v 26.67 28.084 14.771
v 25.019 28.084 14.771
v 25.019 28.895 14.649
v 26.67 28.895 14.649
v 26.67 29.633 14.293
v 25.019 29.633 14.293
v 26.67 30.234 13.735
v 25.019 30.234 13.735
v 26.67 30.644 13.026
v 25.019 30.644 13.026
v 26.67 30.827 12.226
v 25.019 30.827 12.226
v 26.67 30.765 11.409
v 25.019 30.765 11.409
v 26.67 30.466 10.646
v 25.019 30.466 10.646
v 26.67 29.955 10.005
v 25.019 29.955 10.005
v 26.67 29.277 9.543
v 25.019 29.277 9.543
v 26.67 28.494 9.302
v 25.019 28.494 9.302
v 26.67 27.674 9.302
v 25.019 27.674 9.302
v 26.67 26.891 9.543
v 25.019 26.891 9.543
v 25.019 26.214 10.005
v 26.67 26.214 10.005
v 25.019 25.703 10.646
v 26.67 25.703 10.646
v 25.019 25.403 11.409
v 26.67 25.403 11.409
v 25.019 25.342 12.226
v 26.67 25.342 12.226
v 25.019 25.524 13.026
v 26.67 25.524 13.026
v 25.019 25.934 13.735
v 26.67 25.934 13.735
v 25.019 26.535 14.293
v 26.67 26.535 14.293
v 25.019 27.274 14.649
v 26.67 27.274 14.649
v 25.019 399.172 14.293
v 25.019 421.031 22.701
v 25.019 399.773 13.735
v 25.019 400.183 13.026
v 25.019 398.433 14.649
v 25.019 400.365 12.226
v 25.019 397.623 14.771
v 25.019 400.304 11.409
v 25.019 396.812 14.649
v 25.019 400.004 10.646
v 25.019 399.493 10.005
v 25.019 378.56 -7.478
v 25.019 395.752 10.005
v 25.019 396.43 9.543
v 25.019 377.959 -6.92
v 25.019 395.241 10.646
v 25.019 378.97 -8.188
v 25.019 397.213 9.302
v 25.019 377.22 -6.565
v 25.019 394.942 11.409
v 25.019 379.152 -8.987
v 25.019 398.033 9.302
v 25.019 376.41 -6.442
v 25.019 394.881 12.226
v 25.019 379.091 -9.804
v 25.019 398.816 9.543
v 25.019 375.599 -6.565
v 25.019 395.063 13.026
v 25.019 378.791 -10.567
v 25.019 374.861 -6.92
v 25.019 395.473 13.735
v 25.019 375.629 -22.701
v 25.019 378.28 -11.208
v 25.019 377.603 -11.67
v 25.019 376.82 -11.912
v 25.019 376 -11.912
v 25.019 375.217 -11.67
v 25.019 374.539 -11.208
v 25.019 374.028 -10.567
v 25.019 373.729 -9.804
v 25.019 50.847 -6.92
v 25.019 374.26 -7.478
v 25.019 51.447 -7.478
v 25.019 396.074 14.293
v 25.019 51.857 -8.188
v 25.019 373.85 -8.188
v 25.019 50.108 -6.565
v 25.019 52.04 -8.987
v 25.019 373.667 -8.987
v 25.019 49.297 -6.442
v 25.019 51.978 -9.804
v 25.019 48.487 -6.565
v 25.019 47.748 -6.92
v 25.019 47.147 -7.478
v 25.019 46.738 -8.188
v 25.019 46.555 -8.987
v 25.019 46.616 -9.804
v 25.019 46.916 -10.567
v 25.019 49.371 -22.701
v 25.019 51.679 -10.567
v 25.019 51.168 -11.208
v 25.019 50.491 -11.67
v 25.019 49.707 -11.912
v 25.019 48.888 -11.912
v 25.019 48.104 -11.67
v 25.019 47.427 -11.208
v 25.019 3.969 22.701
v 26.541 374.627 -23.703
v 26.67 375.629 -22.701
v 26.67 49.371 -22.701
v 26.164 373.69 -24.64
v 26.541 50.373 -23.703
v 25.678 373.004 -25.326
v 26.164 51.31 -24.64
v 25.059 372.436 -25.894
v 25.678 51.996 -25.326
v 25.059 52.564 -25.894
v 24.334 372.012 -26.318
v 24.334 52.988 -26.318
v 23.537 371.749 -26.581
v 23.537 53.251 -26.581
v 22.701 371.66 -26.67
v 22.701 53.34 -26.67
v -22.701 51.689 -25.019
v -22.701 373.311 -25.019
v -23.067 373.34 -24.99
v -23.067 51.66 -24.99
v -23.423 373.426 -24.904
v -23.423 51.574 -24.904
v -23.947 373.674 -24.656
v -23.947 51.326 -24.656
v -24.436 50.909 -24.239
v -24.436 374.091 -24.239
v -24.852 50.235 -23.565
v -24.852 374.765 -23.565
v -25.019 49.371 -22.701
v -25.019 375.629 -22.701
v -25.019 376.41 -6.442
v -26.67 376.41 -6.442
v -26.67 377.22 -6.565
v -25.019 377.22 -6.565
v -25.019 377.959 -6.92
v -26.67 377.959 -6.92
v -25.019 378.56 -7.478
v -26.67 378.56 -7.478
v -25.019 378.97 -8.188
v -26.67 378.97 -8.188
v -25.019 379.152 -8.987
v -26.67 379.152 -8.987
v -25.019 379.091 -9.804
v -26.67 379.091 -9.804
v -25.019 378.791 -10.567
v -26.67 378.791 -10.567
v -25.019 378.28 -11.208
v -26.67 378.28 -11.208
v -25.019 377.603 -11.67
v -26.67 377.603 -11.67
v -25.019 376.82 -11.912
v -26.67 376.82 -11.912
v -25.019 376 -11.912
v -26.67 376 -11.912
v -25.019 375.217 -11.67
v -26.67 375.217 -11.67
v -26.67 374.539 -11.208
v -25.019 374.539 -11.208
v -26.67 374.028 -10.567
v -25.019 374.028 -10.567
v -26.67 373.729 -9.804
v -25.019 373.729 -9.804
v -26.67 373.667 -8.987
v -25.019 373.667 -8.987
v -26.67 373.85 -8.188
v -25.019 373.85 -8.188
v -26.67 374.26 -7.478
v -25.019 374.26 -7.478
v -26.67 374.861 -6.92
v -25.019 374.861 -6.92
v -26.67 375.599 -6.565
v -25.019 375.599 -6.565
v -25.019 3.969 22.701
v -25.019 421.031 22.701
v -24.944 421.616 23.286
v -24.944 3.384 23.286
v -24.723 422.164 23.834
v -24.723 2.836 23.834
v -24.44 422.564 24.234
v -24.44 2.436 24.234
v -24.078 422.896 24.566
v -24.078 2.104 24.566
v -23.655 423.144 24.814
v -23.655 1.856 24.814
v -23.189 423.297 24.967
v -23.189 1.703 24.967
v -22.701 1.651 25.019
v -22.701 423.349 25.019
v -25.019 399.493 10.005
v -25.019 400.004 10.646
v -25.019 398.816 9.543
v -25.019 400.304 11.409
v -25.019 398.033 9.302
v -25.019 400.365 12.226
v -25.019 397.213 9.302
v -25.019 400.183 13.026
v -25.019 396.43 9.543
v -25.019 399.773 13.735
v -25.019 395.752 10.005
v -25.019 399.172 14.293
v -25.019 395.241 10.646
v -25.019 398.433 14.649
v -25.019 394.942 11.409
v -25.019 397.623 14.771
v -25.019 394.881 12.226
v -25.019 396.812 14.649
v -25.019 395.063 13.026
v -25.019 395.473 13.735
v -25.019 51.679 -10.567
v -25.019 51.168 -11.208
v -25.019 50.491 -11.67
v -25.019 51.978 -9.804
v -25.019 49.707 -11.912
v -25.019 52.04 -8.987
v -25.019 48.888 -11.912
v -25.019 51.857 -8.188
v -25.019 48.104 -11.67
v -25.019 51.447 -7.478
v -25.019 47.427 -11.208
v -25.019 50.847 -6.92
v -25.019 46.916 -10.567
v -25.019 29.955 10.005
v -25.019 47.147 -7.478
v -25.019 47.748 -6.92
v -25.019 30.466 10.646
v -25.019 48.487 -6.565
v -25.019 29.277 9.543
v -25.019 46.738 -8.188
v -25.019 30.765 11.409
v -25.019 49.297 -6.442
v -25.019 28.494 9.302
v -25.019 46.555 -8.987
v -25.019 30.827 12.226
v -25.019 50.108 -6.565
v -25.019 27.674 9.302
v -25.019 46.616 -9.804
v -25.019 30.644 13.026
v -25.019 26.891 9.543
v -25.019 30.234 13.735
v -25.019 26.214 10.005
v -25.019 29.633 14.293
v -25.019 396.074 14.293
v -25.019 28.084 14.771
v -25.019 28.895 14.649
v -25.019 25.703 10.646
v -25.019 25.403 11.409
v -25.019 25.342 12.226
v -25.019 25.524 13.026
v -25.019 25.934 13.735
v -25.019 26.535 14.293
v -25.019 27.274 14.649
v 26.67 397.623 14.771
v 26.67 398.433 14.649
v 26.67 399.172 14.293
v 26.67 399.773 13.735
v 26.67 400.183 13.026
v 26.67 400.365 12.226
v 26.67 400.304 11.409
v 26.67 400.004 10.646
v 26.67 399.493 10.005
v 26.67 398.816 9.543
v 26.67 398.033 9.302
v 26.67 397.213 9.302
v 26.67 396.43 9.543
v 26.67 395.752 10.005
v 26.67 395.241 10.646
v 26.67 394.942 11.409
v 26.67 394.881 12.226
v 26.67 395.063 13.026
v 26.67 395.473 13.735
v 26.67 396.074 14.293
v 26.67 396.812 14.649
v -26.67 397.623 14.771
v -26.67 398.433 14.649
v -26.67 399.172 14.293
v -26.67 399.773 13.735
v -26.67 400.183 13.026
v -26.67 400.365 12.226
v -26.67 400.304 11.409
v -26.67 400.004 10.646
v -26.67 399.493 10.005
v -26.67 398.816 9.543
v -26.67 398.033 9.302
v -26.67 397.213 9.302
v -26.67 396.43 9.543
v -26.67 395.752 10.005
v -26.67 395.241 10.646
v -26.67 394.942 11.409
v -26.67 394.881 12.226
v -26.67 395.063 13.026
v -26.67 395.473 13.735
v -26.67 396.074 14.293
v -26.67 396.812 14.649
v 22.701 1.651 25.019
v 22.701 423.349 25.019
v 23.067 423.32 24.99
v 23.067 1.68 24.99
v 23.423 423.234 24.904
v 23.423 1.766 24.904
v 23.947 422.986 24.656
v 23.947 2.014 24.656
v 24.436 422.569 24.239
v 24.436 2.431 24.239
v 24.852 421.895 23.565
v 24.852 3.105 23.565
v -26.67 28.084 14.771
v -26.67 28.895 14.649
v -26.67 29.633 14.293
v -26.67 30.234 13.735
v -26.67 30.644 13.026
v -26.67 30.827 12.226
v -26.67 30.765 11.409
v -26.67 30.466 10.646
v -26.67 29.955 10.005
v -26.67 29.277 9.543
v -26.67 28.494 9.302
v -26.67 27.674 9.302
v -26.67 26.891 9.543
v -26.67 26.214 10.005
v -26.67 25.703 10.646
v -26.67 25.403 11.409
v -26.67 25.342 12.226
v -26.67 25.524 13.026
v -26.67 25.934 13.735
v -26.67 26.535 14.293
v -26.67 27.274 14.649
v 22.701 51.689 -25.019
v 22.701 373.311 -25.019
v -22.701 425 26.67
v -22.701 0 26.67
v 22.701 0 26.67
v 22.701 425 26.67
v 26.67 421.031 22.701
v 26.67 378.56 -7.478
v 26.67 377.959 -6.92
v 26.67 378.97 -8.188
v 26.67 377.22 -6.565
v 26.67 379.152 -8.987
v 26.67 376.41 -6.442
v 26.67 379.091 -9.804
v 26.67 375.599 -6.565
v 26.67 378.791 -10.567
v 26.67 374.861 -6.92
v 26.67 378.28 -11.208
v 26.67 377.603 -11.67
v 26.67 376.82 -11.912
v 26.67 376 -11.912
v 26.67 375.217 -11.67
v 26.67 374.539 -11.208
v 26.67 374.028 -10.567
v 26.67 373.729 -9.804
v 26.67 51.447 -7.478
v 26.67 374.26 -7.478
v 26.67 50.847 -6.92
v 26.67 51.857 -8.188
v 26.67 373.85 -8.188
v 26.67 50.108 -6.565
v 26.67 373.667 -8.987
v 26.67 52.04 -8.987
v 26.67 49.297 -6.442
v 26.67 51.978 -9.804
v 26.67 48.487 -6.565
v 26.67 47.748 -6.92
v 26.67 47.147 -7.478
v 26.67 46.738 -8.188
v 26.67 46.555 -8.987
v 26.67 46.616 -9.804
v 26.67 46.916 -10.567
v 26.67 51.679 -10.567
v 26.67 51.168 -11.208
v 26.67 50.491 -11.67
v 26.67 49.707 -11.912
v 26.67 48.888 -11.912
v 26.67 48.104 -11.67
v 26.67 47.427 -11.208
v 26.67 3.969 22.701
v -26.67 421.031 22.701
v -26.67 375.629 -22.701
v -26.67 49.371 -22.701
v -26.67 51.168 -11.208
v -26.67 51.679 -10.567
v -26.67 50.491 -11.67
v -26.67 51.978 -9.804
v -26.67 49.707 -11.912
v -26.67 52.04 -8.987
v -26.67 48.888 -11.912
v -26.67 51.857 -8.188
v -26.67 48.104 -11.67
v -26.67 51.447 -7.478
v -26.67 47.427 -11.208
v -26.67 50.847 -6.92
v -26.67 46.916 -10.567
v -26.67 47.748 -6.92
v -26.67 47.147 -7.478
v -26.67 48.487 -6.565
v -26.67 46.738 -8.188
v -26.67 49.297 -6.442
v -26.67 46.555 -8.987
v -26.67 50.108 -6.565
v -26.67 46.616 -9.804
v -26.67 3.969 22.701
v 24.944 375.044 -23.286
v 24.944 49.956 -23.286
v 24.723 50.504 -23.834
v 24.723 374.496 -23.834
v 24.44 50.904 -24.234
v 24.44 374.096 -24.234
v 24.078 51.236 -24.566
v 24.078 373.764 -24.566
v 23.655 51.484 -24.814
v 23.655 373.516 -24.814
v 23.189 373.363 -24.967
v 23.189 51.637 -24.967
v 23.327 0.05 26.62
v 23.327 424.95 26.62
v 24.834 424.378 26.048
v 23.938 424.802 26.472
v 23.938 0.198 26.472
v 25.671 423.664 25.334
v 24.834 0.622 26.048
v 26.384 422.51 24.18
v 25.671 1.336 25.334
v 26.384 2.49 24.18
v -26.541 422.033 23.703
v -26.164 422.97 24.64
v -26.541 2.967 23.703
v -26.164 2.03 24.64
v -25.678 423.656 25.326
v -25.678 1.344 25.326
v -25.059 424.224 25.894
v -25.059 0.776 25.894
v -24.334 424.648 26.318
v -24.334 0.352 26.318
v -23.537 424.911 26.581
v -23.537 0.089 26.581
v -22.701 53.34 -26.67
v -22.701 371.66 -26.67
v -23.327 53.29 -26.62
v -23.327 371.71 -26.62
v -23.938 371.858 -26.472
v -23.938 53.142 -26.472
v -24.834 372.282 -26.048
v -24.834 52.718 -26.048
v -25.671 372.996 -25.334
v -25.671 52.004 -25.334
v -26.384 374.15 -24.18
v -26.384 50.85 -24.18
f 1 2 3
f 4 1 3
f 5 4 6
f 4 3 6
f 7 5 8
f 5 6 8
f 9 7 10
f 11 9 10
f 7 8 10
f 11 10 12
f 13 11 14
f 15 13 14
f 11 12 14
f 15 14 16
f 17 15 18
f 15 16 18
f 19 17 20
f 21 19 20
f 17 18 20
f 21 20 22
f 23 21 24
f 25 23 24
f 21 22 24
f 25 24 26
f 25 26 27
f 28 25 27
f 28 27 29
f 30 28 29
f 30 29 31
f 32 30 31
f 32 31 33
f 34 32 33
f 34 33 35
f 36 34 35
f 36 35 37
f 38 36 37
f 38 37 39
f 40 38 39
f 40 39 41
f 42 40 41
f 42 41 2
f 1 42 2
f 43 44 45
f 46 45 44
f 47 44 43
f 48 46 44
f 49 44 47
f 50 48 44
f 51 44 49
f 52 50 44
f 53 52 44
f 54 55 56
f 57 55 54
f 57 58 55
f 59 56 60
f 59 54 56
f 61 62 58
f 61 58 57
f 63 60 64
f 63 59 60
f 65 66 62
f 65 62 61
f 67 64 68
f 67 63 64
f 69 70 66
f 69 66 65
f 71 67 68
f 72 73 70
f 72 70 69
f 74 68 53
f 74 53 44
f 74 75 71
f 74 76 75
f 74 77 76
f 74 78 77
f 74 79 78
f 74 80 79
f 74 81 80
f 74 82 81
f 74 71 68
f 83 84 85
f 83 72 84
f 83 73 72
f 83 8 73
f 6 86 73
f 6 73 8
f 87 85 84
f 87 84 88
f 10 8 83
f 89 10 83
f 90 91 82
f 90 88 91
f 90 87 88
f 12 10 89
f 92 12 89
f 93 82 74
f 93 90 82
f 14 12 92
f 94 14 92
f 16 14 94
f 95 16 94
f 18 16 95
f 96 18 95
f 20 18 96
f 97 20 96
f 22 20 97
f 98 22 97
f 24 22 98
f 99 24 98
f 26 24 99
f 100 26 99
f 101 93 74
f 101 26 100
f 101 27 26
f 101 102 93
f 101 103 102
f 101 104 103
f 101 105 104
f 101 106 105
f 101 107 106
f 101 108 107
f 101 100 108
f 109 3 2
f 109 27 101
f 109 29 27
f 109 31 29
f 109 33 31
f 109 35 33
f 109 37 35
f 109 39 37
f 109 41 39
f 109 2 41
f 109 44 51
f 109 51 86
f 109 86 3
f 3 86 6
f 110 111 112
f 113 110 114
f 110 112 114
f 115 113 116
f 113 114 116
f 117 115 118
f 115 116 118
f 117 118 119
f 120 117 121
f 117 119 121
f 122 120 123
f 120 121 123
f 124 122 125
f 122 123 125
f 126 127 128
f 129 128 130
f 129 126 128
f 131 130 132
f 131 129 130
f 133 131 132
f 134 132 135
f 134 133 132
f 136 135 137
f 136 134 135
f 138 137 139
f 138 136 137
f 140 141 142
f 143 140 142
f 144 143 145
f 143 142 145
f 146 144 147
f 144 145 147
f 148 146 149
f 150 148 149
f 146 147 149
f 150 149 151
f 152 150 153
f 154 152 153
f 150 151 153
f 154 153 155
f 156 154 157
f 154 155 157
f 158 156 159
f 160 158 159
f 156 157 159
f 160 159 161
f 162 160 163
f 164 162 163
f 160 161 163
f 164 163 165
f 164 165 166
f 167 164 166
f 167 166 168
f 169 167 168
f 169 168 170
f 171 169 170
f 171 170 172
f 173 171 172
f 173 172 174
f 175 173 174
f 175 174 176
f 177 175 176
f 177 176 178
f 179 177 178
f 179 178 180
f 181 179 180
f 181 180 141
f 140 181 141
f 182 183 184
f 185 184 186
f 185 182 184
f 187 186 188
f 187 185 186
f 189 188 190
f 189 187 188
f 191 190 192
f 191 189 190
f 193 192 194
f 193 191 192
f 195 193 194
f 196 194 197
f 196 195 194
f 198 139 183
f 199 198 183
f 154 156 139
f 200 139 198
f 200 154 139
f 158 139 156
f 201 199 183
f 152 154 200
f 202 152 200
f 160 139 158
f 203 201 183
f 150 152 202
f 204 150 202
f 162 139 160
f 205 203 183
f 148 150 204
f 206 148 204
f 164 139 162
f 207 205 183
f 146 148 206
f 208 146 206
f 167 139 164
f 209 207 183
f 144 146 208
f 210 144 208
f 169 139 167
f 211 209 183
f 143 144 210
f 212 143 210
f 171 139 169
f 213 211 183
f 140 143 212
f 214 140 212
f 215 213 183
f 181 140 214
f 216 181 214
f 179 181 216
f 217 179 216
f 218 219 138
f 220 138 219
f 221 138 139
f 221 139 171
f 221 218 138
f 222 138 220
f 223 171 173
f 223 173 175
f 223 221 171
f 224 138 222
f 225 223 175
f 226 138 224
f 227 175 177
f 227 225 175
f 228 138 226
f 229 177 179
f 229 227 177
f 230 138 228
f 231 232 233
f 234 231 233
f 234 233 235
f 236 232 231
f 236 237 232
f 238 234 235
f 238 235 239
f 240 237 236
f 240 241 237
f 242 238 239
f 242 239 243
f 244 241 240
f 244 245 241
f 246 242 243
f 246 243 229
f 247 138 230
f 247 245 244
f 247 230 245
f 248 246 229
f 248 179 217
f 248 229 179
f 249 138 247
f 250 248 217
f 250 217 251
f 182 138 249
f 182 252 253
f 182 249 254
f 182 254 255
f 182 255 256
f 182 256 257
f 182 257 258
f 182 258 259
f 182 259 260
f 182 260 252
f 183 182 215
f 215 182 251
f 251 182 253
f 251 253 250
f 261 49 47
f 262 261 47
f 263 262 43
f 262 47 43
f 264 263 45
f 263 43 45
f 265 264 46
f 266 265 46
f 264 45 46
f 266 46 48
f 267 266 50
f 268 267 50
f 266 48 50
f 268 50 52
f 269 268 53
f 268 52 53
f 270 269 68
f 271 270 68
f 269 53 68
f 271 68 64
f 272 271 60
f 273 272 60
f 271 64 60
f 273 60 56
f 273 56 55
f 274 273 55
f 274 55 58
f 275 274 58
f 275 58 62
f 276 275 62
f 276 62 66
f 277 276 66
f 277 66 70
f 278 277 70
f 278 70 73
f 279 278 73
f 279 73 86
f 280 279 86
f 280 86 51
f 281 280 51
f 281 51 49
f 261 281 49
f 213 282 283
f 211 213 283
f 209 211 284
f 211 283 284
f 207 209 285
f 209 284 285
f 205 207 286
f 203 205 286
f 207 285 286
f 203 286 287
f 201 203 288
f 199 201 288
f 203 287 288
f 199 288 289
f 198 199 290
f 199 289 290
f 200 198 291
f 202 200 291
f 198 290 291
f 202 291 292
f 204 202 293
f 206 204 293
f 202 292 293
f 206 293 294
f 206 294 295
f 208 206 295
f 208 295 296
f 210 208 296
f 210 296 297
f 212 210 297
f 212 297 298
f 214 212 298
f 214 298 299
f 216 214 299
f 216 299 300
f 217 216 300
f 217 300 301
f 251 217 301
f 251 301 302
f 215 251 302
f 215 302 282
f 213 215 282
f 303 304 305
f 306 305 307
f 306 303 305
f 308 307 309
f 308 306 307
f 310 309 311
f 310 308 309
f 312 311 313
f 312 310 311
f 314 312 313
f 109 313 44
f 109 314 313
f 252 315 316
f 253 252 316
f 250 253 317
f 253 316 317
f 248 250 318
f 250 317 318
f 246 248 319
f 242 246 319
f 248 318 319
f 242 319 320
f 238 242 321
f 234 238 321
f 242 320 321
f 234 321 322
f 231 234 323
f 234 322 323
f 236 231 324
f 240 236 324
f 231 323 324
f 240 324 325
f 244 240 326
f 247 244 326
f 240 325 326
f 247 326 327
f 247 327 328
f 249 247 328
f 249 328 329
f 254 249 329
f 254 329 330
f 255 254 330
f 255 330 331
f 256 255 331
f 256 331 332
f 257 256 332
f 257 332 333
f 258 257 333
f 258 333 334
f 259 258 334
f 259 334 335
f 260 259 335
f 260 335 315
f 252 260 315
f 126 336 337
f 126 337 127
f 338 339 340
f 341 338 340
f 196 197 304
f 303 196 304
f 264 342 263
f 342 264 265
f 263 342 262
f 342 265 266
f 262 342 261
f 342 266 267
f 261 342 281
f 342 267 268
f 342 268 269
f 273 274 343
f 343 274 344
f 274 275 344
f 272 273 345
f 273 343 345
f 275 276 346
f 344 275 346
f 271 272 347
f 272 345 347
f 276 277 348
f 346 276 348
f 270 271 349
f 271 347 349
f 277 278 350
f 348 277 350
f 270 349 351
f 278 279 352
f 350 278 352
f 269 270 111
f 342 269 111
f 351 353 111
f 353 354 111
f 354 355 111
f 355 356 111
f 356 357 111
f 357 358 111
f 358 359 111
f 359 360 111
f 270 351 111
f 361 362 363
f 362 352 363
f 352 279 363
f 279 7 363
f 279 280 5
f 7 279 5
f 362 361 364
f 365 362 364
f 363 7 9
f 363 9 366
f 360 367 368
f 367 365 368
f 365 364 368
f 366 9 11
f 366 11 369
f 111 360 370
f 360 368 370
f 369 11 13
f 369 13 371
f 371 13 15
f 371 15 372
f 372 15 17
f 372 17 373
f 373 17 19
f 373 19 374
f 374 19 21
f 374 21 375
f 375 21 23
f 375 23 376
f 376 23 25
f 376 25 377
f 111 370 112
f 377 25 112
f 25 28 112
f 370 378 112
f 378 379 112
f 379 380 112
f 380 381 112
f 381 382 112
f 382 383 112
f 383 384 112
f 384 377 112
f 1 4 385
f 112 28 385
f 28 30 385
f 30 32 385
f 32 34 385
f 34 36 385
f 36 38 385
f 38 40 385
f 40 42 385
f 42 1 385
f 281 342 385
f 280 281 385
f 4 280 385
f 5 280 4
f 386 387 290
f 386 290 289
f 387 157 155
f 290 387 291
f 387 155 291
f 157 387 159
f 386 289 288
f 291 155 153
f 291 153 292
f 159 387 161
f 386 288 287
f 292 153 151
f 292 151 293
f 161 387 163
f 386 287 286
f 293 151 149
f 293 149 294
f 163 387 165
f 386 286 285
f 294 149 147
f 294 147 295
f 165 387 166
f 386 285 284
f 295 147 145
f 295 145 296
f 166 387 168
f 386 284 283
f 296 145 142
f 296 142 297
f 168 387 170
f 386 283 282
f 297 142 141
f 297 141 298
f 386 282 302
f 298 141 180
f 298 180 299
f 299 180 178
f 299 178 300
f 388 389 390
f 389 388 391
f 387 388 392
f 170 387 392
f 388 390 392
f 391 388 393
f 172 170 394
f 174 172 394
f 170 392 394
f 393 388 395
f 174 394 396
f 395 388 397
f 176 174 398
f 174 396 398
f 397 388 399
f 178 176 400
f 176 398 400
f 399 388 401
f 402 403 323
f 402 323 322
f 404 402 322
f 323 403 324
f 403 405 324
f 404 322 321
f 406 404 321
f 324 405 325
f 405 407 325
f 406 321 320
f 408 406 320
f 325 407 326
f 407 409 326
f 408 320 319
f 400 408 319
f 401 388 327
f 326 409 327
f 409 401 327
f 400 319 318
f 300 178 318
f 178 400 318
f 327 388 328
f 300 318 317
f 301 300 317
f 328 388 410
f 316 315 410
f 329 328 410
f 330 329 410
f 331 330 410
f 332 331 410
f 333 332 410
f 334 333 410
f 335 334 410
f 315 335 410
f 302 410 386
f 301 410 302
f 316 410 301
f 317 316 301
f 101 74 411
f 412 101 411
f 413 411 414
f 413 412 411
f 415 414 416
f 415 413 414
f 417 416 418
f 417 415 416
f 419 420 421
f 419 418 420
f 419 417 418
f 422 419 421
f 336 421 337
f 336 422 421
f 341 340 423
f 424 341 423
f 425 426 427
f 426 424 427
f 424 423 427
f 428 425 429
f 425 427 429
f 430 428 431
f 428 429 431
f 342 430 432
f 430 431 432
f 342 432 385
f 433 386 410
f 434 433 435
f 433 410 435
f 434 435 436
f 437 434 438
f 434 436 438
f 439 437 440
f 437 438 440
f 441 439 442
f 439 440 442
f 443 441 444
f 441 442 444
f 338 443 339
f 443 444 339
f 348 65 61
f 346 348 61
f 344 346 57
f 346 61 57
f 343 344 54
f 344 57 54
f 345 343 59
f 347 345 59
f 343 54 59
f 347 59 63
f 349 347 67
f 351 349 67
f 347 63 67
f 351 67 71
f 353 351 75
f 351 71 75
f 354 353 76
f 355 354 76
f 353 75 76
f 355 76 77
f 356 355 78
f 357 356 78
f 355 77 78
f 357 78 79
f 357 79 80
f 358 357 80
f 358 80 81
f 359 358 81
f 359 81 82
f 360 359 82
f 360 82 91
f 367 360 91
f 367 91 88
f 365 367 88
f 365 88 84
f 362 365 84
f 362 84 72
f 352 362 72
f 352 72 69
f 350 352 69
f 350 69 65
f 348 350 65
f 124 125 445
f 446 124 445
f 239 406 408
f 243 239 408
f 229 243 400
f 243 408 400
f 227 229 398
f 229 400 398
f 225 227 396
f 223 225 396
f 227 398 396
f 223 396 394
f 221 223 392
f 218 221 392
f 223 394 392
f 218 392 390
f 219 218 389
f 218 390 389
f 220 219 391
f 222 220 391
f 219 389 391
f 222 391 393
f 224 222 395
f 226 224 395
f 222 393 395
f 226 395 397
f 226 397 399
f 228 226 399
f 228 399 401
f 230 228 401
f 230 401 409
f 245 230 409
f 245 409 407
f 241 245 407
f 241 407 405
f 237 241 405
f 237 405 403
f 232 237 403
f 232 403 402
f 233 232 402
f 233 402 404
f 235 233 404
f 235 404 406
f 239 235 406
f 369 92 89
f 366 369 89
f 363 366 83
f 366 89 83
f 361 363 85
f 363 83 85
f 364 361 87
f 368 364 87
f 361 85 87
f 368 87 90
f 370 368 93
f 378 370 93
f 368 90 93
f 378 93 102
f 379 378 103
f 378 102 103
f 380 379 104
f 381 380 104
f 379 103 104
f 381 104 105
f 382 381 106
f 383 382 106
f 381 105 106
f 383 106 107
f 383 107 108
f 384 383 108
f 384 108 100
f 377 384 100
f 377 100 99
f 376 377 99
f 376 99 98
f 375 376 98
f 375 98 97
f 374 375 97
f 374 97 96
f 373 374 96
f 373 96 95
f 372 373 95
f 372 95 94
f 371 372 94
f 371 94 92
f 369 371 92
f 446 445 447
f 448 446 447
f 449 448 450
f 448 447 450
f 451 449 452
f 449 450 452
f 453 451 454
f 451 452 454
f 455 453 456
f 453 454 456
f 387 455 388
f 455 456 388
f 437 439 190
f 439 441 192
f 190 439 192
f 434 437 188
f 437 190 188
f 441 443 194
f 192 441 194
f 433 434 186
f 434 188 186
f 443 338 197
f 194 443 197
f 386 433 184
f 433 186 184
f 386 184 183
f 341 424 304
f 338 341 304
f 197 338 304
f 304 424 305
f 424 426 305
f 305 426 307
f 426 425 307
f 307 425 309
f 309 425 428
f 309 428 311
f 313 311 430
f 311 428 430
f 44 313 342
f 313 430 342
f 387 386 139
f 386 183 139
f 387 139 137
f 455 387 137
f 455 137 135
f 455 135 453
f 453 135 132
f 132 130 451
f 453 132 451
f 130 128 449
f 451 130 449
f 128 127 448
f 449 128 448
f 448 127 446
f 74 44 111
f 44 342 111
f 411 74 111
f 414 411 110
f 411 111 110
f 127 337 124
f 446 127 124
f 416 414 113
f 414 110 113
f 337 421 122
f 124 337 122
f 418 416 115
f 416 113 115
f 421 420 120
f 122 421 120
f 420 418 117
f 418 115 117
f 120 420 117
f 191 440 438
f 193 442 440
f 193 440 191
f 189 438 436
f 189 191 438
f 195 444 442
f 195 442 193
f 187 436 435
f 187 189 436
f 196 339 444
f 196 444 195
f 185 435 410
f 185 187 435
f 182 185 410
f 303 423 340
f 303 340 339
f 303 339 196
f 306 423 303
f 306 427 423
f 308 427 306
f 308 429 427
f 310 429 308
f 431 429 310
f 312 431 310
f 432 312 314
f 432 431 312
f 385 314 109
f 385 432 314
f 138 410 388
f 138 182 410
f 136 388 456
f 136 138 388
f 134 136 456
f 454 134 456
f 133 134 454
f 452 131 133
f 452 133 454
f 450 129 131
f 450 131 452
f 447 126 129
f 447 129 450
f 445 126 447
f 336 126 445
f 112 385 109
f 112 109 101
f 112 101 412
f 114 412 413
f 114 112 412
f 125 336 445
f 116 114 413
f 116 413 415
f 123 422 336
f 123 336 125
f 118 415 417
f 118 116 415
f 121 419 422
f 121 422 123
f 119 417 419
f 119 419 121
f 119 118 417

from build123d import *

# Parameters (mm, degrees)
STRUCTURAL_MEMBER1_DEPTH = 425
CUT_EXTRUDE1_DEPTH       = 430.163657012
M5_CLEARANCE_HOLE1_D     = 5.5


with BuildPart() as part:
    # Sketch16 → Structural Member1 (new body)
    with BuildSketch(Plane.ZX):
        with BuildLine():
            Line((-26.67, 22.70125), (-26.67, -22.70125))
            ThreePointArc((-26.67, -22.70125), (-25.507580038, -25.507580038), (-22.70125, -26.67))
            Line((-22.70125, -26.67), (22.70125, -26.67))
            ThreePointArc((22.70125, -26.67), (25.507580038, -25.507580038), (26.67, -22.70125))
            Line((26.67, -22.70125), (26.67, 22.70125))
            ThreePointArc((26.67, 22.70125), (25.507580038, 25.507580038), (22.70125, 26.67))
            Line((22.70125, 26.67), (-22.70125, 26.67))
            ThreePointArc((-22.70125, 26.67), (-25.507580038, 25.507580038), (-26.67, 22.70125))
        make_face()
        with BuildLine():
            Line((-25.019, 22.70125), (-25.019, -22.70125))
            ThreePointArc((-25.019, -22.70125), (-24.340146742, -24.340146742), (-22.70125, -25.019))
            Line((-22.70125, -25.019), (22.70125, -25.019))
            ThreePointArc((22.70125, -25.019), (24.340146742, -24.340146742), (25.019, -22.70125))
            Line((25.019, -22.70125), (25.019, 22.70125))
            ThreePointArc((25.019, 22.70125), (24.340146742, 24.340146742), (22.70125, 25.019))
            Line((22.70125, 25.019), (-22.70125, 25.019))
            ThreePointArc((-22.70125, 25.019), (-24.340146742, 24.340146742), (-25.019, 22.70125))
        make_face(mode=Mode.SUBTRACT)
    extrude(amount=STRUCTURAL_MEMBER1_DEPTH)

    # Sketch12 → Cut-Extrude1 (cut, through all)
    with BuildSketch(Plane(origin=(26.67, 0, 0), x_dir=(0, 0, -1), z_dir=(1, 0, 0))):
        Polygon((-26.67, 425), (26.67, 371.66), (26.67, 425), align=None)
        Polygon((26.67, 0), (-26.67, 0), (26.67, 53.34), align=None)
    extrude(amount=-CUT_EXTRUDE1_DEPTH, mode=Mode.SUBTRACT)

    # M5 Clearance Hole1 (through all)
    with Locations(Plane(origin=(26.67, 0, 0), x_dir=(0, 0, -1), z_dir=(1, 0, 0))):
        with Locations((-12.02081528, 397.622893219), (9.192388155, 376.409689783), (-12.02081528, 28.084213562), (9.192388155, 49.297416998)):
            Hole(M5_CLEARANCE_HOLE1_D / 2)


solid = part.part
